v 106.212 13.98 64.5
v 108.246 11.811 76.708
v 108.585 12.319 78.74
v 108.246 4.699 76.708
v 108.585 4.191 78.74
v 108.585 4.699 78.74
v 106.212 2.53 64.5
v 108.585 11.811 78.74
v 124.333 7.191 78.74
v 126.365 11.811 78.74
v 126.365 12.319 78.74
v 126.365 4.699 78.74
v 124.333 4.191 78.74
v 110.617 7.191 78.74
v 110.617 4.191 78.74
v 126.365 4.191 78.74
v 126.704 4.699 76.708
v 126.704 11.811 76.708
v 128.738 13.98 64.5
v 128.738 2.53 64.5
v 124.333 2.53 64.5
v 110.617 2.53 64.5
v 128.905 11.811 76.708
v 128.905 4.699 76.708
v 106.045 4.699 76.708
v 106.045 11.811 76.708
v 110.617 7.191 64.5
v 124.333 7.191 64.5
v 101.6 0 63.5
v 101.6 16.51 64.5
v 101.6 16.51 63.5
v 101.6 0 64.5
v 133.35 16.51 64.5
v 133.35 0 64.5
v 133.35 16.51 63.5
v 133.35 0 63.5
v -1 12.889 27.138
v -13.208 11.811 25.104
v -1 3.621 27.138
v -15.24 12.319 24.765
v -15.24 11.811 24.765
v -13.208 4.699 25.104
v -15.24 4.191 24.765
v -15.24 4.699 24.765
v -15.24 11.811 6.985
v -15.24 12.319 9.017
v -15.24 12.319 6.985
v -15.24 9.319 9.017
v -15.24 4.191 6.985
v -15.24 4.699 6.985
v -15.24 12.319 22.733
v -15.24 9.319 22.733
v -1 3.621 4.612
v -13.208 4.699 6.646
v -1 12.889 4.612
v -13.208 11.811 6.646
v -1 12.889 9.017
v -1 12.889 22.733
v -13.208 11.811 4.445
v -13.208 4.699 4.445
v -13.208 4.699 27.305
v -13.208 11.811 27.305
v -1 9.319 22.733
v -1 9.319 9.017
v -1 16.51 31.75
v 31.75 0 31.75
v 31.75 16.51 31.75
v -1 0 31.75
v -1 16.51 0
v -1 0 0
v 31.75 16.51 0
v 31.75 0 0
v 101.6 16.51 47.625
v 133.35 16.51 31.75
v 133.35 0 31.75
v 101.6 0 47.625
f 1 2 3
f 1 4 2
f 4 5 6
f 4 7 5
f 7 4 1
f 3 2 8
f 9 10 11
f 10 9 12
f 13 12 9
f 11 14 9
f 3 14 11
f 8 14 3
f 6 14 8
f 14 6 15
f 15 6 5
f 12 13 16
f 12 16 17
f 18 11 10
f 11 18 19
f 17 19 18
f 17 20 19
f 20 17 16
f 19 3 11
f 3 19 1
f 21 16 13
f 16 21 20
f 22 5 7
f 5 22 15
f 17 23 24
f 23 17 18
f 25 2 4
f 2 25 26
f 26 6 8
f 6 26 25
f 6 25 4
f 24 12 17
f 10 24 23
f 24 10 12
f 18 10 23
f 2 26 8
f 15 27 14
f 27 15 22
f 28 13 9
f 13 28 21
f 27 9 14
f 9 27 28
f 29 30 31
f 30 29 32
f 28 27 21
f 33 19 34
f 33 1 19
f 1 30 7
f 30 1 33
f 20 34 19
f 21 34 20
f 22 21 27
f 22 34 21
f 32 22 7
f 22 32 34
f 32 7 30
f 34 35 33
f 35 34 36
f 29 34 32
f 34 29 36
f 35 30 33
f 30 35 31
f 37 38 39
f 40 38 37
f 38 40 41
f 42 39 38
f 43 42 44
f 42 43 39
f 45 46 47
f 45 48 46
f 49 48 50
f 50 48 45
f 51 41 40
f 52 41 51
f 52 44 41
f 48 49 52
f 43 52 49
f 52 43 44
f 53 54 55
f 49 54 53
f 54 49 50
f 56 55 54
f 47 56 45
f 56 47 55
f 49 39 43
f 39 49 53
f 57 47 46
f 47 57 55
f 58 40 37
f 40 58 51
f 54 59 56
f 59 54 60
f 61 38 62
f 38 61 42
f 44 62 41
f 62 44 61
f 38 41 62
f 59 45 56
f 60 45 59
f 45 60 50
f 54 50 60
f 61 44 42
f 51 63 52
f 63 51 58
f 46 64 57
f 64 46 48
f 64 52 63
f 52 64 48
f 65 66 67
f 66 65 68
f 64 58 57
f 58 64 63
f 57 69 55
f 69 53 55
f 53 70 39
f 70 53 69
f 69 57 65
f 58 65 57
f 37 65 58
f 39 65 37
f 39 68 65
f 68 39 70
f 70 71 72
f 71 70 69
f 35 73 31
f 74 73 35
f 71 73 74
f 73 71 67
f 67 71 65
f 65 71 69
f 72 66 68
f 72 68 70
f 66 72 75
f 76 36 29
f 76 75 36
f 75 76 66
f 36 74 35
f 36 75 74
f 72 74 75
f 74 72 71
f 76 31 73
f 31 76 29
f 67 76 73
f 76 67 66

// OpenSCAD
// file: connector.scad
include <defines.scad>

module trapezoid(l1, l2, width, height) {
    assert(l1 > l2);

    c_y = abs((l2 - l1))/2;
    d_y = c_y;

    f_y = l1 - c_y;
    g_y = f_y;

    trapezoid_points = [
        [0, 0, 0],            // a
        [width, 0, 0],        // b
        [0, c_y, height],     // c
        [width, d_y, height], // d
        [width, l1, 0],       // e
        [width, f_y, height], // f
        [0, g_y, height],     // g
        [0, l1, 0]            // h
    ];

    a = 0;
    b = 1;
    c = 2;
    d = 3;
    e = 4;
    f = 5;
    g = 6;
    h = 7;

    trapezoid_faces = [
        [a, b, e, h],
        [a, c, d, b],
        [a, h, g, c],
        [d, f, e, b],
        [c, g, f, d],
        [h, e, f, g],
    ];

    polyhedron(points=trapezoid_points, faces=trapezoid_faces);
}

module trapezoid2(base_width, base_length, top_width, top_length, height) {
    assert(base_width > top_width);
    assert(base_length > top_length);

    width_diff = abs(base_width - top_width) / 2;
    length_diff = abs(base_length - top_length) / 2;

    b_x = base_width;

    c_x = width_diff;
    c_y = length_diff;

    d_x = base_width - width_diff;
    d_y = c_y;

    e_x = base_width;
    e_y = base_length;

    f_x = base_width - width_diff;
    f_y = base_length - length_diff;

    g_x = width_diff;
    g_y = base_length - length_diff;

    h_y = base_length;

    trapezoid_points = [
        [0, 0, 0],          // a
        [b_x, 0, 0],        // b
        [c_x, c_y, height], // c
        [d_x, d_y, height], // d
        [e_x, e_y, 0],      // e
        [f_x, f_y, height], // f
        [g_x, g_y, height], // g
        [0, h_y, 0]         // h
    ];

    a = 0;
    b = 1;
    c = 2;
    d = 3;
    e = 4;
    f = 5;
    g = 6;
    h = 7;

    trapezoid_faces = [
        [a, b, e, h],
        [a, c, d, b],
        [a, h, g, c],
        [d, f, e, b],
        [c, g, f, d],
        [h, e, f, g],
    ];

    polyhedron(points=trapezoid_points, faces=trapezoid_faces);
}

module connector(cutout_width, cutout_offset, cutout_depth=1, tabs=true,
                 base=true, side_b_base=SIDE_B_BASE) {
    depth = 0;
    if (base == true) {
        depth = BASE_DEPTH;
        cube([BASE_WIDTH, BASE_HEIGHT, BASE_DEPTH]);
    }

    move_x = abs(SIDE_A_BASE - BASE_WIDTH) / 2;
    move_y = abs(side_b_base - BASE_HEIGHT) / 2;

    translate([move_x, move_y, depth]) {
        difference() {
            union() {
                trapezoid2(SIDE_A_BASE, side_b_base, SIDE_A_TOP, SIDE_B_TOP, SIDE_A_HEIGHT);
                if (true == tabs) {
                    translate([0, TAB_WIDTH + (side_b_base - TAB_WIDTH)/2, SIDE_A_HEIGHT - TAB_DEPTH])
                        rotate([0, 0, -90])
                            trapezoid(SIDE_A_BASE, SIDE_A_TOP, TAB_WIDTH, TAB_DEPTH);
                }
            }

            cutout_x = (SIDE_A_BASE - SIDE_A_TOP) / 2;
            cutout_y = SIDE_B_TOP - cutout_depth + (side_b_base - SIDE_B_TOP) / 2;
            
            translate([cutout_x + cutout_offset, cutout_y, -1]) {
                cube([cutout_width, 10, SIDE_A_HEIGHT + 2]);
            }
        }
    }

}

// connector(10, 1, tabs=true, base=true);
// file: defines.scad
// External measurements from the magnetic knife holder (in inches)

// SIDE A
//
//   TOP
// |------|
//         
//  ------    -
// / TABS \   |
// --------   |height
// /      \   |
// --------   -
//         
// |------|
//   BASE   
SIDE_A_BASE_INCHES = 0.9;
SIDE_A_TOP_INCHES = 0.7;
SIDE_A_HEIGHT_INCHES = 0.60;

TAB_WIDTH_INCHES = 0.28;
TAB_DEPTH_INCHES = 0.08;

// SIDE B
//       
//   TOP
// |------|
//         
//  ------    -
// /      \   |height
// --------   -
//         
// |------|
//   BASE   
// 

// BASE is different between connectors in addittion to the tab location
SIDE_B_BASE_INCHES = 0.46; 
SIDE_B_TOP_INCHES = 0.32;
SIDE_B_HEIGHT_INCHES = SIDE_A_HEIGHT_INCHES;

// BASE (Just a square)
// 
// Measured as 1.30" by 0.71", butttt the corners should be rounded. I'm going
// to shrink things a bit so that we don't have to round the corners?
BASE_WIDTH_INCHES = 1.25; 
BASE_HEIGHT_INCHES = 0.65;

INCHES_TO_MM = 25.4 / 1; // mm per inch

// Below here is in mm

SIDE_A_BASE = SIDE_A_BASE_INCHES * INCHES_TO_MM;
SIDE_A_TOP = SIDE_A_TOP_INCHES * INCHES_TO_MM;
SIDE_A_HEIGHT = SIDE_A_HEIGHT_INCHES * INCHES_TO_MM;

SIDE_B_BASE = SIDE_B_BASE_INCHES * INCHES_TO_MM;
SIDE_B_TOP = SIDE_B_TOP_INCHES * INCHES_TO_MM;
SIDE_B_HEIGHT = SIDE_B_HEIGHT_INCHES * INCHES_TO_MM;

BASE_WIDTH = BASE_WIDTH_INCHES * INCHES_TO_MM;
BASE_HEIGHT = BASE_HEIGHT_INCHES * INCHES_TO_MM;
BASE_DEPTH = 1.0;

TAB_WIDTH = TAB_WIDTH_INCHES * INCHES_TO_MM;
TAB_DEPTH = TAB_DEPTH_INCHES * INCHES_TO_MM;
// main file
include <defines.scad>
include <connector.scad>

LENGTH_REFERENCE_INCHES = 5.25;
HEIGHT_REFERENCE_INCHES = 2.50;

CONNECTOR_A_OFFSET_INCHES = 0.08;
CONNECTOR_A_WIDTH_INCHES = SIDE_A_TOP_INCHES - 2*CONNECTOR_A_OFFSET_INCHES;

CONNECTOR_B_OFFSET_INCHES = 0.08;
CONNECTOR_B_WIDTH_INCHES = SIDE_A_TOP_INCHES - 2*CONNECTOR_A_OFFSET_INCHES;

LENGTH_REFERECE = LENGTH_REFERENCE_INCHES * INCHES_TO_MM;
HEIGHT_REFERECE = HEIGHT_REFERENCE_INCHES * INCHES_TO_MM;

CONNECTOR_A_WIDTH = CONNECTOR_A_WIDTH_INCHES * INCHES_TO_MM;
CONNECTOR_A_OFFSET = CONNECTOR_A_OFFSET_INCHES * INCHES_TO_MM;

CONNECTOR_B_WIDTH = CONNECTOR_B_WIDTH_INCHES * INCHES_TO_MM;
CONNECTOR_B_OFFSET = CONNECTOR_B_OFFSET_INCHES * INCHES_TO_MM;

// STRUT      
// -----       
//             
// aX -> first side or second side
//
// a1->h1 -> BASE_WIDTH  (w1)
// a1->a2 -> BASE_HEIGHT (w2)
//             
//    e ----- d _
//    f |   |   |h
// h   /   /  c |e
// ---/   /     |i
// | g   /      |h
// -----/       |g
// a    b       |t
//              _
// |--------|
//   length   
module strut(l, h) {
    w1 = BASE_WIDTH;
    w2 = BASE_HEIGHT;

    b_y = w1;
    c_z = h - BASE_WIDTH;
    e_y = l - BASE_WIDTH;

    f_y = l - BASE_WIDTH;
    f_z = (h / 3) < BASE_WIDTH ? 0.75*h : h - BASE_WIDTH;

    g_y = (l / 3) < BASE_WIDTH ? 0.25*l : w1;
    g_z = BASE_WIDTH;

    strut_points = [
        [w2, 0, 0],     // a1
        [w2, b_y, 0],   // b1
        [w2, l, c_z],   // c1
        [w2, l, h],     // d1
        [w2, e_y, h],   // e1
        [w2, f_y, f_z], // f1
        [w2, g_y, g_z], // g1
        [w2, 0, w1],    // h1

        [ 0, 0, 0],     // a2
        [ 0, b_y, 0],   // b2
        [ 0, l, c_z],   // c2
        [ 0, l, h],     // d2
        [ 0, e_y, h],   // e2
        [ 0, f_y, f_z], // f2
        [ 0, g_y, g_z], // g2
        [ 0, 0, w1],    // h2
    ];

    a1 = 0;
    b1 = 1;
    c1 = 2;
    d1 = 3;
    e1 = 4;
    f1 = 5;
    g1 = 6;
    h1 = 7;

    a2 = 8;
    b2 = 9;
    c2 = 10;
    d2 = 11;
    e2 = 12;
    f2 = 13;
    g2 = 14;
    h2 = 15;

    strut_faces = [
        [a1, a2, h2, h1],

        [a1, h1, g1, b1],
        [b1, g1, f1, c1],
        [f1, e1, d1, c1],

        [e1, e2, d2, d1], 
        [d1, d2, c2, c1], 
        [c1, c2, b2, b1], 
        [b1, b2, a2, a1], 
        [a2, b2, g2, h2],

        [b2, c2, f2, g2],
        [c2, d2, e2, f2],

        [f1, f2, e2, e1],
        [g1, g2, f2, f1],
        [h1, h2, g2, g1],
    ];

    polyhedron(points=strut_points, faces=strut_faces);
}

module short(length, height) {
    // TOP CONNECTOR
    translate([length, BASE_HEIGHT, height]) rotate([0, 0, 180]) connector(CONNECTOR_B_WIDTH, CONNECTOR_B_OFFSET, cutout_depth=3);

    translate([0, BASE_HEIGHT, 0]) rotate([0, 0, -90]) strut(length, height);

    // BOTTOM CONNECTOR
    translate([0, 0, 0]) rotate([0, -90, 0]) connector(CONNECTOR_A_WIDTH, CONNECTOR_A_OFFSET, cutout_depth=3, side_b_base=0.8*SIDE_B_BASE);
}

short(LENGTH_REFERECE, HEIGHT_REFERECE);
